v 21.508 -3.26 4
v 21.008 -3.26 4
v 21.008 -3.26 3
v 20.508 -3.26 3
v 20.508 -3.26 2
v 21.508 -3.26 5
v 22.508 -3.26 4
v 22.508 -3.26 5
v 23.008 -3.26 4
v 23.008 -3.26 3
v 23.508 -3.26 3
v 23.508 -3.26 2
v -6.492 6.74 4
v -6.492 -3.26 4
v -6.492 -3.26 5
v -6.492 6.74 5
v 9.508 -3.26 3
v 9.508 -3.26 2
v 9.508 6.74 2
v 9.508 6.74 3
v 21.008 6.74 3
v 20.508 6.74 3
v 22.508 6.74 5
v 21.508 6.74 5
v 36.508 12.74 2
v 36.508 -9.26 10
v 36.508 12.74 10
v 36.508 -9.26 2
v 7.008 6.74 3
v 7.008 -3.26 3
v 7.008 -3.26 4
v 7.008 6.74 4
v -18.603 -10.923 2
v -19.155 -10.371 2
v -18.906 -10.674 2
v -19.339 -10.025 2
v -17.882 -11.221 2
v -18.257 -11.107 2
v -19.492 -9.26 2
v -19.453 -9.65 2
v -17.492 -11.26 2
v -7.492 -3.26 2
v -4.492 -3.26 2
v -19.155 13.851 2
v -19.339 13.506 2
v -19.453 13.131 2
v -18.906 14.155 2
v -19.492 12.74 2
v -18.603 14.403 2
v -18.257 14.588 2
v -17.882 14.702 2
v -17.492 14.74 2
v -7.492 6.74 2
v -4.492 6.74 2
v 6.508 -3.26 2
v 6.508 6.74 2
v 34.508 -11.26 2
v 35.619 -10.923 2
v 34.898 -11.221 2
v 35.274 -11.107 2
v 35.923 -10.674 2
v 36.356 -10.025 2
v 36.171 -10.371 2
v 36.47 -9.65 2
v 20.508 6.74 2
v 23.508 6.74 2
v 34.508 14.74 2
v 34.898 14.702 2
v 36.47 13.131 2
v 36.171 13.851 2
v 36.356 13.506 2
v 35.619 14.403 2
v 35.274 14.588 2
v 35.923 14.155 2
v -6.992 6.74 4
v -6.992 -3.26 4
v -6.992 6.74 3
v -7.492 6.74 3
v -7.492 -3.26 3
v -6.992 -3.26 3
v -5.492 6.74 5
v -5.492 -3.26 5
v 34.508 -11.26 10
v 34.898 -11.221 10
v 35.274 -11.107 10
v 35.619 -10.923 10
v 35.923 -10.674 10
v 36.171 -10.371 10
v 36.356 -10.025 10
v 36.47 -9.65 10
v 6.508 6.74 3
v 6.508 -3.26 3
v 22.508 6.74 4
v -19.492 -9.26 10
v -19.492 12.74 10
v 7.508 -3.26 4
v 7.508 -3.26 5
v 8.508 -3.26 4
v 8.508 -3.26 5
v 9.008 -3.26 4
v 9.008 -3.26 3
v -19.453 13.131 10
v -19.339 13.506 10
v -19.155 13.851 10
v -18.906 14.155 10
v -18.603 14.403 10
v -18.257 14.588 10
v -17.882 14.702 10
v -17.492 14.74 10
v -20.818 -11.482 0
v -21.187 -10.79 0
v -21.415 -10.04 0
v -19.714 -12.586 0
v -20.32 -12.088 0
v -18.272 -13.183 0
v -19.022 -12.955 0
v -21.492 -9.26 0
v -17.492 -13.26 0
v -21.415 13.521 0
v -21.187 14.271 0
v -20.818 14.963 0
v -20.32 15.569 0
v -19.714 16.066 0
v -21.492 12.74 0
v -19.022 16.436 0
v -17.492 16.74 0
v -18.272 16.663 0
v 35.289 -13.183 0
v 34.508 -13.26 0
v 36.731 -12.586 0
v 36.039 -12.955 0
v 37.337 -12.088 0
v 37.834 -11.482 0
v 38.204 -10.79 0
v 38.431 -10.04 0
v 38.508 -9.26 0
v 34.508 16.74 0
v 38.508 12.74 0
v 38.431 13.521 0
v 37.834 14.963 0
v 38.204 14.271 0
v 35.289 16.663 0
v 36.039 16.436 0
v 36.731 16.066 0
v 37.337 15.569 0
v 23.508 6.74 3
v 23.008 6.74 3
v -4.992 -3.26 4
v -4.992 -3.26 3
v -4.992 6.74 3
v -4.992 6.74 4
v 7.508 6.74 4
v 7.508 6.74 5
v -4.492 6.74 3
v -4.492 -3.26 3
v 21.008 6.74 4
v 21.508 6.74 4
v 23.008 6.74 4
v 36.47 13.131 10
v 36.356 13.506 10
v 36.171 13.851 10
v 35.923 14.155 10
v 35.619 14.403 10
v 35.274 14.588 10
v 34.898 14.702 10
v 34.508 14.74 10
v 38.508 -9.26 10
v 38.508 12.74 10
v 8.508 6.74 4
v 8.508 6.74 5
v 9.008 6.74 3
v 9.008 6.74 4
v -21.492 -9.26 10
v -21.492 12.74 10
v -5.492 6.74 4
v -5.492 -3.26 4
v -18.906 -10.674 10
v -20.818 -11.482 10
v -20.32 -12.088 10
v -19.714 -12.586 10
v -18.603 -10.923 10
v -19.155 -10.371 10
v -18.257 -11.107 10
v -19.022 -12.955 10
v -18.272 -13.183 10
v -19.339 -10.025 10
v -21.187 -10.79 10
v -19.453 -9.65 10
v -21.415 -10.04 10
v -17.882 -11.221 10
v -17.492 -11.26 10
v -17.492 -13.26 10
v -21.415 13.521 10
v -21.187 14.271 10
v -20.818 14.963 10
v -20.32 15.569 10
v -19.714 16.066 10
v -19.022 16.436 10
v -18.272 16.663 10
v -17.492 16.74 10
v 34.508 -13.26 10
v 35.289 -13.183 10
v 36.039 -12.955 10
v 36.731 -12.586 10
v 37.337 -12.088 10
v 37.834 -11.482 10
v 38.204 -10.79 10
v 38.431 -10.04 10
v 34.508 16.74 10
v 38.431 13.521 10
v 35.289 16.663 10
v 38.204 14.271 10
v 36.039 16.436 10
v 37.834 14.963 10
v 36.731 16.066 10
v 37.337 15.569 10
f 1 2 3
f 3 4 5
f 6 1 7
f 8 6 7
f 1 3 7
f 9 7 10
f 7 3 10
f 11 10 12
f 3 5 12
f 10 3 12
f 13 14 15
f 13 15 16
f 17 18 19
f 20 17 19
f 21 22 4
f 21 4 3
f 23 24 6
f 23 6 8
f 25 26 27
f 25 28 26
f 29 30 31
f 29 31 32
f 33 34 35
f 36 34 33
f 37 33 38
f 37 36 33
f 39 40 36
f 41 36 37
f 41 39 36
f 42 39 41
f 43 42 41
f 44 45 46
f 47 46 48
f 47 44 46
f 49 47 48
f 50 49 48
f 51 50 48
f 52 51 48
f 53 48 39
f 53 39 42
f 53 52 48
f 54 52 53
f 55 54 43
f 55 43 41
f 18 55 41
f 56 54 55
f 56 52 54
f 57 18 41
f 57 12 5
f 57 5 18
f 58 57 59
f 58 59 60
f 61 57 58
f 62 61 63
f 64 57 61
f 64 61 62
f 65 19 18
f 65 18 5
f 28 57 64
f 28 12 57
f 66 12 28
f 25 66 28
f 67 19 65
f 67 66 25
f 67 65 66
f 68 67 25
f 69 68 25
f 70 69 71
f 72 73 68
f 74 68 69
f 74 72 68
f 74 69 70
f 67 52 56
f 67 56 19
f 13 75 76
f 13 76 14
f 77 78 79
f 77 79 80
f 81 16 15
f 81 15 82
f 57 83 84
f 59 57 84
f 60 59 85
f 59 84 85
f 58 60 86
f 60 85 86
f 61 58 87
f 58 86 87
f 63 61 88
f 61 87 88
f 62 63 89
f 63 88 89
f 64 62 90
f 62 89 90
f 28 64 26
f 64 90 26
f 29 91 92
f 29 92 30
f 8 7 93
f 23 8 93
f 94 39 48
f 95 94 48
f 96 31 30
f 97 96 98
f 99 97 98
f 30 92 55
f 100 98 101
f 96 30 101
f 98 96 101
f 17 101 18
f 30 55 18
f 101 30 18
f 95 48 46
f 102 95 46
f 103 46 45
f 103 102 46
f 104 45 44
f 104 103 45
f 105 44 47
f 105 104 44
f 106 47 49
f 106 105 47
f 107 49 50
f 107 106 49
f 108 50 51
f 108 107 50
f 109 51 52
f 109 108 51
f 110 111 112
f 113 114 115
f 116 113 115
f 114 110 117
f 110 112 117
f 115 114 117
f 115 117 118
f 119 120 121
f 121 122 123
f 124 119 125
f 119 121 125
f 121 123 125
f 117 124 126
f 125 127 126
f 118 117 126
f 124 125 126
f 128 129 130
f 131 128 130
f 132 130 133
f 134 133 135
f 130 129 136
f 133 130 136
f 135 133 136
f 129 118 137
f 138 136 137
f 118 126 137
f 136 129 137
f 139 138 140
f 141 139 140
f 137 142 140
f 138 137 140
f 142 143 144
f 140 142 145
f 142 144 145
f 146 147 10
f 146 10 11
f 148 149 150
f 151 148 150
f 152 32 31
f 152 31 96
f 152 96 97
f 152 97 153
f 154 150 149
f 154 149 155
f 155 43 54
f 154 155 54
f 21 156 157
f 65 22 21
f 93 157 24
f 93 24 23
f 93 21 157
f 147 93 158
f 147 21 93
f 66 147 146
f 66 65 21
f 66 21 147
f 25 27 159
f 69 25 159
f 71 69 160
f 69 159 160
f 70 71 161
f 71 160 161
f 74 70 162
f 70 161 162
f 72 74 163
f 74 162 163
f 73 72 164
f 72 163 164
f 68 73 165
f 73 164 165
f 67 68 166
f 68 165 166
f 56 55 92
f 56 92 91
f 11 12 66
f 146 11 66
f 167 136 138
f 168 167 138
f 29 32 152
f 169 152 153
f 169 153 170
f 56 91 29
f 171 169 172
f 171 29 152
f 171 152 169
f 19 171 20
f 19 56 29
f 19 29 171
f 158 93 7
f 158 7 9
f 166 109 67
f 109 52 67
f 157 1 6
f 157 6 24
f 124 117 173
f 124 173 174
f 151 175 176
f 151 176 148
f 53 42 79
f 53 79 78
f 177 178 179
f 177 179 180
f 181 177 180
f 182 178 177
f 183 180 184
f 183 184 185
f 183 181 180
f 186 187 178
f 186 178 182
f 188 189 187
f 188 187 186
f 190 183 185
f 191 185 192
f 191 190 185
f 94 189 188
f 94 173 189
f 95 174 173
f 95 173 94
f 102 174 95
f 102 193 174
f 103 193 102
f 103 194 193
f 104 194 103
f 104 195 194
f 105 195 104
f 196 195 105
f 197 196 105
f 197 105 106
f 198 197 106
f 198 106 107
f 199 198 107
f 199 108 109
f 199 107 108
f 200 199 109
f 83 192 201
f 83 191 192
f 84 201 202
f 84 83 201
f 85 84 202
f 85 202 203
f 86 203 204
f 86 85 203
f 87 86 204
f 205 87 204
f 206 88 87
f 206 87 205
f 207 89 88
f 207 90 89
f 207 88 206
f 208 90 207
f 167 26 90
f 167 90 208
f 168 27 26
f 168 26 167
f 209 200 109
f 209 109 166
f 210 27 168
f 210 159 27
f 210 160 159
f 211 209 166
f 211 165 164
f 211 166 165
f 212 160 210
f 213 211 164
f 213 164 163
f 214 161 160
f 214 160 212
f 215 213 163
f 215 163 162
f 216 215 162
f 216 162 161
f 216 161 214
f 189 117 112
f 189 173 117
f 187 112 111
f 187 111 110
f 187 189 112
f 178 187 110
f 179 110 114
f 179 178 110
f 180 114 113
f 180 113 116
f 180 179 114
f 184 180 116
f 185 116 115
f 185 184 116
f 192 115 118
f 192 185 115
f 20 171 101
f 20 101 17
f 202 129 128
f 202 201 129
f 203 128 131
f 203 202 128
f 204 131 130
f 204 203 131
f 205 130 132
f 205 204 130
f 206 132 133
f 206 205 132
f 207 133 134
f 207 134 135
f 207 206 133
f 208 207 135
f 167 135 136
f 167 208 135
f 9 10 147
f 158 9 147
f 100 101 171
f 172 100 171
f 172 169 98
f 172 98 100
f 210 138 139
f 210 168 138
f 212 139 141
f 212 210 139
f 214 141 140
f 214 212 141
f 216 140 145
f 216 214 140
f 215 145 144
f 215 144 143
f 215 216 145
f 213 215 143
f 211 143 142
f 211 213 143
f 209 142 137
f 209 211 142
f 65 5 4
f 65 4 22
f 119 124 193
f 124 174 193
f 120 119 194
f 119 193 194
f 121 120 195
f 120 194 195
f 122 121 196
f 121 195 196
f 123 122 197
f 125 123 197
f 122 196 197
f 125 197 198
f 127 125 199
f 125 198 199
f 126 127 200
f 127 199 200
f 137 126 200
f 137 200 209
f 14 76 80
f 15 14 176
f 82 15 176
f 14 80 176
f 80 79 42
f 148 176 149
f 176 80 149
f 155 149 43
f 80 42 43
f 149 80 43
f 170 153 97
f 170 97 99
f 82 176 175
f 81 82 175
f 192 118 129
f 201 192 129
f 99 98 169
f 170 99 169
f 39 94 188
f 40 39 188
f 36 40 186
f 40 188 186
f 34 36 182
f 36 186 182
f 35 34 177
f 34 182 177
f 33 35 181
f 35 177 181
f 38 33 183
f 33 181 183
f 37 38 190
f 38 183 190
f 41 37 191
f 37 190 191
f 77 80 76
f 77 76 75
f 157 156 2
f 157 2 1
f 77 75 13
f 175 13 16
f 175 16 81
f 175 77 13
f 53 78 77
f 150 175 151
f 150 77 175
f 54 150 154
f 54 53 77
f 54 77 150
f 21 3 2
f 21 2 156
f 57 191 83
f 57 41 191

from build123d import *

# Parameters (mm, degrees)
SKETCH1_W           = 60
SKETCH1_H           = 30
BOSS_EXTRUDE1_DEPTH = 10
FILLET1_R           = 4
SHELL1_T            = -2
SKETCH29_W          = 3
SKETCH29_H          = 10
BOSS_EXTRUDE2_DEPTH = 1
SKETCH30_W          = 2
SKETCH30_H          = 10
BOSS_EXTRUDE3_DEPTH = 1
SKETCH31_W          = 1
SKETCH31_H          = 10
BOSS_EXTRUDE4_DEPTH = 1


with BuildPart() as part:
    # Sketch1 → Boss-Extrude1 (new body)
    with BuildSketch(Plane.XY):
        with Locations((8.508287293, 1.740331492)):
            Rectangle(SKETCH1_W, SKETCH1_H)
    extrude(amount=BOSS_EXTRUDE1_DEPTH)

    # Fillet1
    fillet1_edges = [part.edges().sort_by_distance(p)[0] for p in [
        (-21.491712707, 16.740331492, 5),
        (38.508287293, 16.740331492, 5),
        (38.508287293, -13.259668508, 5),
        (-21.491712707, -13.259668508, 5),
    ]]
    fillet(fillet1_edges, radius=FILLET1_R)

    # Shell1
    shell1_openings = [part.faces().sort_by_distance(p)[0] for p in [
        (8.508287293, 1.740331492, 10),
    ]]
    offset(amount=SHELL1_T, openings=shell1_openings, kind=Kind.INTERSECTION)

    # Sketch29 → Boss-Extrude2 (add)
    with BuildSketch(Plane.XY.offset(2)):
        with Locations((22.008287293, 1.740331492)):
            Rectangle(SKETCH29_W, SKETCH29_H)
        with Locations((8.008287293, 1.740331492)):
            Rectangle(SKETCH29_W, SKETCH29_H)
        with Locations((-5.991712707, 1.740331492)):
            Rectangle(SKETCH29_W, SKETCH29_H)
    extrude(amount=BOSS_EXTRUDE2_DEPTH)

    # Sketch30 → Boss-Extrude3 (add)
    with BuildSketch(Plane.XY.offset(3)):
        with Locations((22.008287293, 1.740331492)):
            Rectangle(SKETCH30_W, SKETCH30_H)
        with Locations((8.008287293, 1.740331492)):
            Rectangle(SKETCH30_W, SKETCH30_H)
        with Locations((-5.991712707, 1.740331492)):
            Rectangle(SKETCH30_W, SKETCH30_H)
    extrude(amount=BOSS_EXTRUDE3_DEPTH)

    # Sketch31 → Boss-Extrude4 (add)
    with BuildSketch(Plane.XY.offset(4)):
        with Locations((22.008287293, 1.740331492)):
            Rectangle(SKETCH31_W, SKETCH31_H)
        with Locations((8.008287293, 1.740331492)):
            Rectangle(SKETCH31_W, SKETCH31_H)
        with Locations((-5.991712707, 1.740331492)):
            Rectangle(SKETCH31_W, SKETCH31_H)
    extrude(amount=BOSS_EXTRUDE4_DEPTH)


solid = part.part
